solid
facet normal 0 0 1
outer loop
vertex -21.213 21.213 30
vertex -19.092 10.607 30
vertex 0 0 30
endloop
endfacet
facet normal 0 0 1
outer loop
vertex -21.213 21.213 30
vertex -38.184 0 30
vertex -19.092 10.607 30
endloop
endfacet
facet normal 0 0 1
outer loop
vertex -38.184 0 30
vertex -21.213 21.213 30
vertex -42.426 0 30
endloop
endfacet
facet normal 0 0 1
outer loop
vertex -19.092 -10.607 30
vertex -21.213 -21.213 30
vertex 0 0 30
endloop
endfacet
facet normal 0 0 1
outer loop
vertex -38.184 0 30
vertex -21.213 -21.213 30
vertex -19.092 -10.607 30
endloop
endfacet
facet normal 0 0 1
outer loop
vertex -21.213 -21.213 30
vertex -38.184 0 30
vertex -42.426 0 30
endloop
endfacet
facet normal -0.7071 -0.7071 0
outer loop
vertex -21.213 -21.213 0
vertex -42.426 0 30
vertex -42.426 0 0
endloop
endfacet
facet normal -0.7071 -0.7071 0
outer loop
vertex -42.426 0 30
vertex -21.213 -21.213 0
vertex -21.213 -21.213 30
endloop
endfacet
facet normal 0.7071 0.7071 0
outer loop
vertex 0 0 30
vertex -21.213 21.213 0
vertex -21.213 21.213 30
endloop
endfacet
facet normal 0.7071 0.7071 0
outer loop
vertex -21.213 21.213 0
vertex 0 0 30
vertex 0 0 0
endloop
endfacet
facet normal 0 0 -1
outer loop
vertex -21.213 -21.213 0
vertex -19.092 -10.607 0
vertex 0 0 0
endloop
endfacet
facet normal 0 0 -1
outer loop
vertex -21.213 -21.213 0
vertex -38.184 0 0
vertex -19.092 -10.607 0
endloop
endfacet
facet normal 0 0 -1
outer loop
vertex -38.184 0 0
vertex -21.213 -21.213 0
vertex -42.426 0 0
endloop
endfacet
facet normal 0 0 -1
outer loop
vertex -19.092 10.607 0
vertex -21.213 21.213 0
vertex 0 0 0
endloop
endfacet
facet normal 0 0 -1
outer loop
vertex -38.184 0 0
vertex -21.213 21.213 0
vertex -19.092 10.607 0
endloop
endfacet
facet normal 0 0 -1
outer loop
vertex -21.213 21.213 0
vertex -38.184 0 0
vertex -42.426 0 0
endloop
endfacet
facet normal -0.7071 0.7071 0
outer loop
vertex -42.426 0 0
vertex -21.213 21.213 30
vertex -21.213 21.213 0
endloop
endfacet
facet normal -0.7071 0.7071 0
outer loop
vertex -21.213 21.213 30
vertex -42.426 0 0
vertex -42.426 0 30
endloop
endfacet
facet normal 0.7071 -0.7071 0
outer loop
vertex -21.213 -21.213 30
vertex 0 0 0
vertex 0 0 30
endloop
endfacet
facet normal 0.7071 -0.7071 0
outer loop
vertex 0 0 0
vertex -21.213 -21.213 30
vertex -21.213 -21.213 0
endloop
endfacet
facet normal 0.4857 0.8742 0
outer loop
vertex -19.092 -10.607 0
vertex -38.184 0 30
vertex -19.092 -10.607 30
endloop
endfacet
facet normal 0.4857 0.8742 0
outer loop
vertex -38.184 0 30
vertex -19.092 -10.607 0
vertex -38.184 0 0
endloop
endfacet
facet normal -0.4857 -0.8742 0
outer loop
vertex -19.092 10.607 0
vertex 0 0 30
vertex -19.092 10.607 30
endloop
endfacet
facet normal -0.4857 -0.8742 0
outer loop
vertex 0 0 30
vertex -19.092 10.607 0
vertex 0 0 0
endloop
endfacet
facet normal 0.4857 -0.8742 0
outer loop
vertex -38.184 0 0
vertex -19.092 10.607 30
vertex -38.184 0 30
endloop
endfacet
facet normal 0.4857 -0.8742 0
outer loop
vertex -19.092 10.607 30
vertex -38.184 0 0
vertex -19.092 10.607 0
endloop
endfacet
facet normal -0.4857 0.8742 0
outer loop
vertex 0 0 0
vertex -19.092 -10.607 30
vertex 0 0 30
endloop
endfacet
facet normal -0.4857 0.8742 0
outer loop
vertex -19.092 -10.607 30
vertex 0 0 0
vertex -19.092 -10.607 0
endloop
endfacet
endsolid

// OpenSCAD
rotate([0,0,90])
rotate([0,-90,0]){
    difference(){
        rotate([-45,0,0]) {
            cube([30, 30, 30]);
        }
        scale([1,0.9,0.5]) {
            rotate([-45,0,0]) {
                cube([30, 30, 30]);
            }
        }
    }
}
